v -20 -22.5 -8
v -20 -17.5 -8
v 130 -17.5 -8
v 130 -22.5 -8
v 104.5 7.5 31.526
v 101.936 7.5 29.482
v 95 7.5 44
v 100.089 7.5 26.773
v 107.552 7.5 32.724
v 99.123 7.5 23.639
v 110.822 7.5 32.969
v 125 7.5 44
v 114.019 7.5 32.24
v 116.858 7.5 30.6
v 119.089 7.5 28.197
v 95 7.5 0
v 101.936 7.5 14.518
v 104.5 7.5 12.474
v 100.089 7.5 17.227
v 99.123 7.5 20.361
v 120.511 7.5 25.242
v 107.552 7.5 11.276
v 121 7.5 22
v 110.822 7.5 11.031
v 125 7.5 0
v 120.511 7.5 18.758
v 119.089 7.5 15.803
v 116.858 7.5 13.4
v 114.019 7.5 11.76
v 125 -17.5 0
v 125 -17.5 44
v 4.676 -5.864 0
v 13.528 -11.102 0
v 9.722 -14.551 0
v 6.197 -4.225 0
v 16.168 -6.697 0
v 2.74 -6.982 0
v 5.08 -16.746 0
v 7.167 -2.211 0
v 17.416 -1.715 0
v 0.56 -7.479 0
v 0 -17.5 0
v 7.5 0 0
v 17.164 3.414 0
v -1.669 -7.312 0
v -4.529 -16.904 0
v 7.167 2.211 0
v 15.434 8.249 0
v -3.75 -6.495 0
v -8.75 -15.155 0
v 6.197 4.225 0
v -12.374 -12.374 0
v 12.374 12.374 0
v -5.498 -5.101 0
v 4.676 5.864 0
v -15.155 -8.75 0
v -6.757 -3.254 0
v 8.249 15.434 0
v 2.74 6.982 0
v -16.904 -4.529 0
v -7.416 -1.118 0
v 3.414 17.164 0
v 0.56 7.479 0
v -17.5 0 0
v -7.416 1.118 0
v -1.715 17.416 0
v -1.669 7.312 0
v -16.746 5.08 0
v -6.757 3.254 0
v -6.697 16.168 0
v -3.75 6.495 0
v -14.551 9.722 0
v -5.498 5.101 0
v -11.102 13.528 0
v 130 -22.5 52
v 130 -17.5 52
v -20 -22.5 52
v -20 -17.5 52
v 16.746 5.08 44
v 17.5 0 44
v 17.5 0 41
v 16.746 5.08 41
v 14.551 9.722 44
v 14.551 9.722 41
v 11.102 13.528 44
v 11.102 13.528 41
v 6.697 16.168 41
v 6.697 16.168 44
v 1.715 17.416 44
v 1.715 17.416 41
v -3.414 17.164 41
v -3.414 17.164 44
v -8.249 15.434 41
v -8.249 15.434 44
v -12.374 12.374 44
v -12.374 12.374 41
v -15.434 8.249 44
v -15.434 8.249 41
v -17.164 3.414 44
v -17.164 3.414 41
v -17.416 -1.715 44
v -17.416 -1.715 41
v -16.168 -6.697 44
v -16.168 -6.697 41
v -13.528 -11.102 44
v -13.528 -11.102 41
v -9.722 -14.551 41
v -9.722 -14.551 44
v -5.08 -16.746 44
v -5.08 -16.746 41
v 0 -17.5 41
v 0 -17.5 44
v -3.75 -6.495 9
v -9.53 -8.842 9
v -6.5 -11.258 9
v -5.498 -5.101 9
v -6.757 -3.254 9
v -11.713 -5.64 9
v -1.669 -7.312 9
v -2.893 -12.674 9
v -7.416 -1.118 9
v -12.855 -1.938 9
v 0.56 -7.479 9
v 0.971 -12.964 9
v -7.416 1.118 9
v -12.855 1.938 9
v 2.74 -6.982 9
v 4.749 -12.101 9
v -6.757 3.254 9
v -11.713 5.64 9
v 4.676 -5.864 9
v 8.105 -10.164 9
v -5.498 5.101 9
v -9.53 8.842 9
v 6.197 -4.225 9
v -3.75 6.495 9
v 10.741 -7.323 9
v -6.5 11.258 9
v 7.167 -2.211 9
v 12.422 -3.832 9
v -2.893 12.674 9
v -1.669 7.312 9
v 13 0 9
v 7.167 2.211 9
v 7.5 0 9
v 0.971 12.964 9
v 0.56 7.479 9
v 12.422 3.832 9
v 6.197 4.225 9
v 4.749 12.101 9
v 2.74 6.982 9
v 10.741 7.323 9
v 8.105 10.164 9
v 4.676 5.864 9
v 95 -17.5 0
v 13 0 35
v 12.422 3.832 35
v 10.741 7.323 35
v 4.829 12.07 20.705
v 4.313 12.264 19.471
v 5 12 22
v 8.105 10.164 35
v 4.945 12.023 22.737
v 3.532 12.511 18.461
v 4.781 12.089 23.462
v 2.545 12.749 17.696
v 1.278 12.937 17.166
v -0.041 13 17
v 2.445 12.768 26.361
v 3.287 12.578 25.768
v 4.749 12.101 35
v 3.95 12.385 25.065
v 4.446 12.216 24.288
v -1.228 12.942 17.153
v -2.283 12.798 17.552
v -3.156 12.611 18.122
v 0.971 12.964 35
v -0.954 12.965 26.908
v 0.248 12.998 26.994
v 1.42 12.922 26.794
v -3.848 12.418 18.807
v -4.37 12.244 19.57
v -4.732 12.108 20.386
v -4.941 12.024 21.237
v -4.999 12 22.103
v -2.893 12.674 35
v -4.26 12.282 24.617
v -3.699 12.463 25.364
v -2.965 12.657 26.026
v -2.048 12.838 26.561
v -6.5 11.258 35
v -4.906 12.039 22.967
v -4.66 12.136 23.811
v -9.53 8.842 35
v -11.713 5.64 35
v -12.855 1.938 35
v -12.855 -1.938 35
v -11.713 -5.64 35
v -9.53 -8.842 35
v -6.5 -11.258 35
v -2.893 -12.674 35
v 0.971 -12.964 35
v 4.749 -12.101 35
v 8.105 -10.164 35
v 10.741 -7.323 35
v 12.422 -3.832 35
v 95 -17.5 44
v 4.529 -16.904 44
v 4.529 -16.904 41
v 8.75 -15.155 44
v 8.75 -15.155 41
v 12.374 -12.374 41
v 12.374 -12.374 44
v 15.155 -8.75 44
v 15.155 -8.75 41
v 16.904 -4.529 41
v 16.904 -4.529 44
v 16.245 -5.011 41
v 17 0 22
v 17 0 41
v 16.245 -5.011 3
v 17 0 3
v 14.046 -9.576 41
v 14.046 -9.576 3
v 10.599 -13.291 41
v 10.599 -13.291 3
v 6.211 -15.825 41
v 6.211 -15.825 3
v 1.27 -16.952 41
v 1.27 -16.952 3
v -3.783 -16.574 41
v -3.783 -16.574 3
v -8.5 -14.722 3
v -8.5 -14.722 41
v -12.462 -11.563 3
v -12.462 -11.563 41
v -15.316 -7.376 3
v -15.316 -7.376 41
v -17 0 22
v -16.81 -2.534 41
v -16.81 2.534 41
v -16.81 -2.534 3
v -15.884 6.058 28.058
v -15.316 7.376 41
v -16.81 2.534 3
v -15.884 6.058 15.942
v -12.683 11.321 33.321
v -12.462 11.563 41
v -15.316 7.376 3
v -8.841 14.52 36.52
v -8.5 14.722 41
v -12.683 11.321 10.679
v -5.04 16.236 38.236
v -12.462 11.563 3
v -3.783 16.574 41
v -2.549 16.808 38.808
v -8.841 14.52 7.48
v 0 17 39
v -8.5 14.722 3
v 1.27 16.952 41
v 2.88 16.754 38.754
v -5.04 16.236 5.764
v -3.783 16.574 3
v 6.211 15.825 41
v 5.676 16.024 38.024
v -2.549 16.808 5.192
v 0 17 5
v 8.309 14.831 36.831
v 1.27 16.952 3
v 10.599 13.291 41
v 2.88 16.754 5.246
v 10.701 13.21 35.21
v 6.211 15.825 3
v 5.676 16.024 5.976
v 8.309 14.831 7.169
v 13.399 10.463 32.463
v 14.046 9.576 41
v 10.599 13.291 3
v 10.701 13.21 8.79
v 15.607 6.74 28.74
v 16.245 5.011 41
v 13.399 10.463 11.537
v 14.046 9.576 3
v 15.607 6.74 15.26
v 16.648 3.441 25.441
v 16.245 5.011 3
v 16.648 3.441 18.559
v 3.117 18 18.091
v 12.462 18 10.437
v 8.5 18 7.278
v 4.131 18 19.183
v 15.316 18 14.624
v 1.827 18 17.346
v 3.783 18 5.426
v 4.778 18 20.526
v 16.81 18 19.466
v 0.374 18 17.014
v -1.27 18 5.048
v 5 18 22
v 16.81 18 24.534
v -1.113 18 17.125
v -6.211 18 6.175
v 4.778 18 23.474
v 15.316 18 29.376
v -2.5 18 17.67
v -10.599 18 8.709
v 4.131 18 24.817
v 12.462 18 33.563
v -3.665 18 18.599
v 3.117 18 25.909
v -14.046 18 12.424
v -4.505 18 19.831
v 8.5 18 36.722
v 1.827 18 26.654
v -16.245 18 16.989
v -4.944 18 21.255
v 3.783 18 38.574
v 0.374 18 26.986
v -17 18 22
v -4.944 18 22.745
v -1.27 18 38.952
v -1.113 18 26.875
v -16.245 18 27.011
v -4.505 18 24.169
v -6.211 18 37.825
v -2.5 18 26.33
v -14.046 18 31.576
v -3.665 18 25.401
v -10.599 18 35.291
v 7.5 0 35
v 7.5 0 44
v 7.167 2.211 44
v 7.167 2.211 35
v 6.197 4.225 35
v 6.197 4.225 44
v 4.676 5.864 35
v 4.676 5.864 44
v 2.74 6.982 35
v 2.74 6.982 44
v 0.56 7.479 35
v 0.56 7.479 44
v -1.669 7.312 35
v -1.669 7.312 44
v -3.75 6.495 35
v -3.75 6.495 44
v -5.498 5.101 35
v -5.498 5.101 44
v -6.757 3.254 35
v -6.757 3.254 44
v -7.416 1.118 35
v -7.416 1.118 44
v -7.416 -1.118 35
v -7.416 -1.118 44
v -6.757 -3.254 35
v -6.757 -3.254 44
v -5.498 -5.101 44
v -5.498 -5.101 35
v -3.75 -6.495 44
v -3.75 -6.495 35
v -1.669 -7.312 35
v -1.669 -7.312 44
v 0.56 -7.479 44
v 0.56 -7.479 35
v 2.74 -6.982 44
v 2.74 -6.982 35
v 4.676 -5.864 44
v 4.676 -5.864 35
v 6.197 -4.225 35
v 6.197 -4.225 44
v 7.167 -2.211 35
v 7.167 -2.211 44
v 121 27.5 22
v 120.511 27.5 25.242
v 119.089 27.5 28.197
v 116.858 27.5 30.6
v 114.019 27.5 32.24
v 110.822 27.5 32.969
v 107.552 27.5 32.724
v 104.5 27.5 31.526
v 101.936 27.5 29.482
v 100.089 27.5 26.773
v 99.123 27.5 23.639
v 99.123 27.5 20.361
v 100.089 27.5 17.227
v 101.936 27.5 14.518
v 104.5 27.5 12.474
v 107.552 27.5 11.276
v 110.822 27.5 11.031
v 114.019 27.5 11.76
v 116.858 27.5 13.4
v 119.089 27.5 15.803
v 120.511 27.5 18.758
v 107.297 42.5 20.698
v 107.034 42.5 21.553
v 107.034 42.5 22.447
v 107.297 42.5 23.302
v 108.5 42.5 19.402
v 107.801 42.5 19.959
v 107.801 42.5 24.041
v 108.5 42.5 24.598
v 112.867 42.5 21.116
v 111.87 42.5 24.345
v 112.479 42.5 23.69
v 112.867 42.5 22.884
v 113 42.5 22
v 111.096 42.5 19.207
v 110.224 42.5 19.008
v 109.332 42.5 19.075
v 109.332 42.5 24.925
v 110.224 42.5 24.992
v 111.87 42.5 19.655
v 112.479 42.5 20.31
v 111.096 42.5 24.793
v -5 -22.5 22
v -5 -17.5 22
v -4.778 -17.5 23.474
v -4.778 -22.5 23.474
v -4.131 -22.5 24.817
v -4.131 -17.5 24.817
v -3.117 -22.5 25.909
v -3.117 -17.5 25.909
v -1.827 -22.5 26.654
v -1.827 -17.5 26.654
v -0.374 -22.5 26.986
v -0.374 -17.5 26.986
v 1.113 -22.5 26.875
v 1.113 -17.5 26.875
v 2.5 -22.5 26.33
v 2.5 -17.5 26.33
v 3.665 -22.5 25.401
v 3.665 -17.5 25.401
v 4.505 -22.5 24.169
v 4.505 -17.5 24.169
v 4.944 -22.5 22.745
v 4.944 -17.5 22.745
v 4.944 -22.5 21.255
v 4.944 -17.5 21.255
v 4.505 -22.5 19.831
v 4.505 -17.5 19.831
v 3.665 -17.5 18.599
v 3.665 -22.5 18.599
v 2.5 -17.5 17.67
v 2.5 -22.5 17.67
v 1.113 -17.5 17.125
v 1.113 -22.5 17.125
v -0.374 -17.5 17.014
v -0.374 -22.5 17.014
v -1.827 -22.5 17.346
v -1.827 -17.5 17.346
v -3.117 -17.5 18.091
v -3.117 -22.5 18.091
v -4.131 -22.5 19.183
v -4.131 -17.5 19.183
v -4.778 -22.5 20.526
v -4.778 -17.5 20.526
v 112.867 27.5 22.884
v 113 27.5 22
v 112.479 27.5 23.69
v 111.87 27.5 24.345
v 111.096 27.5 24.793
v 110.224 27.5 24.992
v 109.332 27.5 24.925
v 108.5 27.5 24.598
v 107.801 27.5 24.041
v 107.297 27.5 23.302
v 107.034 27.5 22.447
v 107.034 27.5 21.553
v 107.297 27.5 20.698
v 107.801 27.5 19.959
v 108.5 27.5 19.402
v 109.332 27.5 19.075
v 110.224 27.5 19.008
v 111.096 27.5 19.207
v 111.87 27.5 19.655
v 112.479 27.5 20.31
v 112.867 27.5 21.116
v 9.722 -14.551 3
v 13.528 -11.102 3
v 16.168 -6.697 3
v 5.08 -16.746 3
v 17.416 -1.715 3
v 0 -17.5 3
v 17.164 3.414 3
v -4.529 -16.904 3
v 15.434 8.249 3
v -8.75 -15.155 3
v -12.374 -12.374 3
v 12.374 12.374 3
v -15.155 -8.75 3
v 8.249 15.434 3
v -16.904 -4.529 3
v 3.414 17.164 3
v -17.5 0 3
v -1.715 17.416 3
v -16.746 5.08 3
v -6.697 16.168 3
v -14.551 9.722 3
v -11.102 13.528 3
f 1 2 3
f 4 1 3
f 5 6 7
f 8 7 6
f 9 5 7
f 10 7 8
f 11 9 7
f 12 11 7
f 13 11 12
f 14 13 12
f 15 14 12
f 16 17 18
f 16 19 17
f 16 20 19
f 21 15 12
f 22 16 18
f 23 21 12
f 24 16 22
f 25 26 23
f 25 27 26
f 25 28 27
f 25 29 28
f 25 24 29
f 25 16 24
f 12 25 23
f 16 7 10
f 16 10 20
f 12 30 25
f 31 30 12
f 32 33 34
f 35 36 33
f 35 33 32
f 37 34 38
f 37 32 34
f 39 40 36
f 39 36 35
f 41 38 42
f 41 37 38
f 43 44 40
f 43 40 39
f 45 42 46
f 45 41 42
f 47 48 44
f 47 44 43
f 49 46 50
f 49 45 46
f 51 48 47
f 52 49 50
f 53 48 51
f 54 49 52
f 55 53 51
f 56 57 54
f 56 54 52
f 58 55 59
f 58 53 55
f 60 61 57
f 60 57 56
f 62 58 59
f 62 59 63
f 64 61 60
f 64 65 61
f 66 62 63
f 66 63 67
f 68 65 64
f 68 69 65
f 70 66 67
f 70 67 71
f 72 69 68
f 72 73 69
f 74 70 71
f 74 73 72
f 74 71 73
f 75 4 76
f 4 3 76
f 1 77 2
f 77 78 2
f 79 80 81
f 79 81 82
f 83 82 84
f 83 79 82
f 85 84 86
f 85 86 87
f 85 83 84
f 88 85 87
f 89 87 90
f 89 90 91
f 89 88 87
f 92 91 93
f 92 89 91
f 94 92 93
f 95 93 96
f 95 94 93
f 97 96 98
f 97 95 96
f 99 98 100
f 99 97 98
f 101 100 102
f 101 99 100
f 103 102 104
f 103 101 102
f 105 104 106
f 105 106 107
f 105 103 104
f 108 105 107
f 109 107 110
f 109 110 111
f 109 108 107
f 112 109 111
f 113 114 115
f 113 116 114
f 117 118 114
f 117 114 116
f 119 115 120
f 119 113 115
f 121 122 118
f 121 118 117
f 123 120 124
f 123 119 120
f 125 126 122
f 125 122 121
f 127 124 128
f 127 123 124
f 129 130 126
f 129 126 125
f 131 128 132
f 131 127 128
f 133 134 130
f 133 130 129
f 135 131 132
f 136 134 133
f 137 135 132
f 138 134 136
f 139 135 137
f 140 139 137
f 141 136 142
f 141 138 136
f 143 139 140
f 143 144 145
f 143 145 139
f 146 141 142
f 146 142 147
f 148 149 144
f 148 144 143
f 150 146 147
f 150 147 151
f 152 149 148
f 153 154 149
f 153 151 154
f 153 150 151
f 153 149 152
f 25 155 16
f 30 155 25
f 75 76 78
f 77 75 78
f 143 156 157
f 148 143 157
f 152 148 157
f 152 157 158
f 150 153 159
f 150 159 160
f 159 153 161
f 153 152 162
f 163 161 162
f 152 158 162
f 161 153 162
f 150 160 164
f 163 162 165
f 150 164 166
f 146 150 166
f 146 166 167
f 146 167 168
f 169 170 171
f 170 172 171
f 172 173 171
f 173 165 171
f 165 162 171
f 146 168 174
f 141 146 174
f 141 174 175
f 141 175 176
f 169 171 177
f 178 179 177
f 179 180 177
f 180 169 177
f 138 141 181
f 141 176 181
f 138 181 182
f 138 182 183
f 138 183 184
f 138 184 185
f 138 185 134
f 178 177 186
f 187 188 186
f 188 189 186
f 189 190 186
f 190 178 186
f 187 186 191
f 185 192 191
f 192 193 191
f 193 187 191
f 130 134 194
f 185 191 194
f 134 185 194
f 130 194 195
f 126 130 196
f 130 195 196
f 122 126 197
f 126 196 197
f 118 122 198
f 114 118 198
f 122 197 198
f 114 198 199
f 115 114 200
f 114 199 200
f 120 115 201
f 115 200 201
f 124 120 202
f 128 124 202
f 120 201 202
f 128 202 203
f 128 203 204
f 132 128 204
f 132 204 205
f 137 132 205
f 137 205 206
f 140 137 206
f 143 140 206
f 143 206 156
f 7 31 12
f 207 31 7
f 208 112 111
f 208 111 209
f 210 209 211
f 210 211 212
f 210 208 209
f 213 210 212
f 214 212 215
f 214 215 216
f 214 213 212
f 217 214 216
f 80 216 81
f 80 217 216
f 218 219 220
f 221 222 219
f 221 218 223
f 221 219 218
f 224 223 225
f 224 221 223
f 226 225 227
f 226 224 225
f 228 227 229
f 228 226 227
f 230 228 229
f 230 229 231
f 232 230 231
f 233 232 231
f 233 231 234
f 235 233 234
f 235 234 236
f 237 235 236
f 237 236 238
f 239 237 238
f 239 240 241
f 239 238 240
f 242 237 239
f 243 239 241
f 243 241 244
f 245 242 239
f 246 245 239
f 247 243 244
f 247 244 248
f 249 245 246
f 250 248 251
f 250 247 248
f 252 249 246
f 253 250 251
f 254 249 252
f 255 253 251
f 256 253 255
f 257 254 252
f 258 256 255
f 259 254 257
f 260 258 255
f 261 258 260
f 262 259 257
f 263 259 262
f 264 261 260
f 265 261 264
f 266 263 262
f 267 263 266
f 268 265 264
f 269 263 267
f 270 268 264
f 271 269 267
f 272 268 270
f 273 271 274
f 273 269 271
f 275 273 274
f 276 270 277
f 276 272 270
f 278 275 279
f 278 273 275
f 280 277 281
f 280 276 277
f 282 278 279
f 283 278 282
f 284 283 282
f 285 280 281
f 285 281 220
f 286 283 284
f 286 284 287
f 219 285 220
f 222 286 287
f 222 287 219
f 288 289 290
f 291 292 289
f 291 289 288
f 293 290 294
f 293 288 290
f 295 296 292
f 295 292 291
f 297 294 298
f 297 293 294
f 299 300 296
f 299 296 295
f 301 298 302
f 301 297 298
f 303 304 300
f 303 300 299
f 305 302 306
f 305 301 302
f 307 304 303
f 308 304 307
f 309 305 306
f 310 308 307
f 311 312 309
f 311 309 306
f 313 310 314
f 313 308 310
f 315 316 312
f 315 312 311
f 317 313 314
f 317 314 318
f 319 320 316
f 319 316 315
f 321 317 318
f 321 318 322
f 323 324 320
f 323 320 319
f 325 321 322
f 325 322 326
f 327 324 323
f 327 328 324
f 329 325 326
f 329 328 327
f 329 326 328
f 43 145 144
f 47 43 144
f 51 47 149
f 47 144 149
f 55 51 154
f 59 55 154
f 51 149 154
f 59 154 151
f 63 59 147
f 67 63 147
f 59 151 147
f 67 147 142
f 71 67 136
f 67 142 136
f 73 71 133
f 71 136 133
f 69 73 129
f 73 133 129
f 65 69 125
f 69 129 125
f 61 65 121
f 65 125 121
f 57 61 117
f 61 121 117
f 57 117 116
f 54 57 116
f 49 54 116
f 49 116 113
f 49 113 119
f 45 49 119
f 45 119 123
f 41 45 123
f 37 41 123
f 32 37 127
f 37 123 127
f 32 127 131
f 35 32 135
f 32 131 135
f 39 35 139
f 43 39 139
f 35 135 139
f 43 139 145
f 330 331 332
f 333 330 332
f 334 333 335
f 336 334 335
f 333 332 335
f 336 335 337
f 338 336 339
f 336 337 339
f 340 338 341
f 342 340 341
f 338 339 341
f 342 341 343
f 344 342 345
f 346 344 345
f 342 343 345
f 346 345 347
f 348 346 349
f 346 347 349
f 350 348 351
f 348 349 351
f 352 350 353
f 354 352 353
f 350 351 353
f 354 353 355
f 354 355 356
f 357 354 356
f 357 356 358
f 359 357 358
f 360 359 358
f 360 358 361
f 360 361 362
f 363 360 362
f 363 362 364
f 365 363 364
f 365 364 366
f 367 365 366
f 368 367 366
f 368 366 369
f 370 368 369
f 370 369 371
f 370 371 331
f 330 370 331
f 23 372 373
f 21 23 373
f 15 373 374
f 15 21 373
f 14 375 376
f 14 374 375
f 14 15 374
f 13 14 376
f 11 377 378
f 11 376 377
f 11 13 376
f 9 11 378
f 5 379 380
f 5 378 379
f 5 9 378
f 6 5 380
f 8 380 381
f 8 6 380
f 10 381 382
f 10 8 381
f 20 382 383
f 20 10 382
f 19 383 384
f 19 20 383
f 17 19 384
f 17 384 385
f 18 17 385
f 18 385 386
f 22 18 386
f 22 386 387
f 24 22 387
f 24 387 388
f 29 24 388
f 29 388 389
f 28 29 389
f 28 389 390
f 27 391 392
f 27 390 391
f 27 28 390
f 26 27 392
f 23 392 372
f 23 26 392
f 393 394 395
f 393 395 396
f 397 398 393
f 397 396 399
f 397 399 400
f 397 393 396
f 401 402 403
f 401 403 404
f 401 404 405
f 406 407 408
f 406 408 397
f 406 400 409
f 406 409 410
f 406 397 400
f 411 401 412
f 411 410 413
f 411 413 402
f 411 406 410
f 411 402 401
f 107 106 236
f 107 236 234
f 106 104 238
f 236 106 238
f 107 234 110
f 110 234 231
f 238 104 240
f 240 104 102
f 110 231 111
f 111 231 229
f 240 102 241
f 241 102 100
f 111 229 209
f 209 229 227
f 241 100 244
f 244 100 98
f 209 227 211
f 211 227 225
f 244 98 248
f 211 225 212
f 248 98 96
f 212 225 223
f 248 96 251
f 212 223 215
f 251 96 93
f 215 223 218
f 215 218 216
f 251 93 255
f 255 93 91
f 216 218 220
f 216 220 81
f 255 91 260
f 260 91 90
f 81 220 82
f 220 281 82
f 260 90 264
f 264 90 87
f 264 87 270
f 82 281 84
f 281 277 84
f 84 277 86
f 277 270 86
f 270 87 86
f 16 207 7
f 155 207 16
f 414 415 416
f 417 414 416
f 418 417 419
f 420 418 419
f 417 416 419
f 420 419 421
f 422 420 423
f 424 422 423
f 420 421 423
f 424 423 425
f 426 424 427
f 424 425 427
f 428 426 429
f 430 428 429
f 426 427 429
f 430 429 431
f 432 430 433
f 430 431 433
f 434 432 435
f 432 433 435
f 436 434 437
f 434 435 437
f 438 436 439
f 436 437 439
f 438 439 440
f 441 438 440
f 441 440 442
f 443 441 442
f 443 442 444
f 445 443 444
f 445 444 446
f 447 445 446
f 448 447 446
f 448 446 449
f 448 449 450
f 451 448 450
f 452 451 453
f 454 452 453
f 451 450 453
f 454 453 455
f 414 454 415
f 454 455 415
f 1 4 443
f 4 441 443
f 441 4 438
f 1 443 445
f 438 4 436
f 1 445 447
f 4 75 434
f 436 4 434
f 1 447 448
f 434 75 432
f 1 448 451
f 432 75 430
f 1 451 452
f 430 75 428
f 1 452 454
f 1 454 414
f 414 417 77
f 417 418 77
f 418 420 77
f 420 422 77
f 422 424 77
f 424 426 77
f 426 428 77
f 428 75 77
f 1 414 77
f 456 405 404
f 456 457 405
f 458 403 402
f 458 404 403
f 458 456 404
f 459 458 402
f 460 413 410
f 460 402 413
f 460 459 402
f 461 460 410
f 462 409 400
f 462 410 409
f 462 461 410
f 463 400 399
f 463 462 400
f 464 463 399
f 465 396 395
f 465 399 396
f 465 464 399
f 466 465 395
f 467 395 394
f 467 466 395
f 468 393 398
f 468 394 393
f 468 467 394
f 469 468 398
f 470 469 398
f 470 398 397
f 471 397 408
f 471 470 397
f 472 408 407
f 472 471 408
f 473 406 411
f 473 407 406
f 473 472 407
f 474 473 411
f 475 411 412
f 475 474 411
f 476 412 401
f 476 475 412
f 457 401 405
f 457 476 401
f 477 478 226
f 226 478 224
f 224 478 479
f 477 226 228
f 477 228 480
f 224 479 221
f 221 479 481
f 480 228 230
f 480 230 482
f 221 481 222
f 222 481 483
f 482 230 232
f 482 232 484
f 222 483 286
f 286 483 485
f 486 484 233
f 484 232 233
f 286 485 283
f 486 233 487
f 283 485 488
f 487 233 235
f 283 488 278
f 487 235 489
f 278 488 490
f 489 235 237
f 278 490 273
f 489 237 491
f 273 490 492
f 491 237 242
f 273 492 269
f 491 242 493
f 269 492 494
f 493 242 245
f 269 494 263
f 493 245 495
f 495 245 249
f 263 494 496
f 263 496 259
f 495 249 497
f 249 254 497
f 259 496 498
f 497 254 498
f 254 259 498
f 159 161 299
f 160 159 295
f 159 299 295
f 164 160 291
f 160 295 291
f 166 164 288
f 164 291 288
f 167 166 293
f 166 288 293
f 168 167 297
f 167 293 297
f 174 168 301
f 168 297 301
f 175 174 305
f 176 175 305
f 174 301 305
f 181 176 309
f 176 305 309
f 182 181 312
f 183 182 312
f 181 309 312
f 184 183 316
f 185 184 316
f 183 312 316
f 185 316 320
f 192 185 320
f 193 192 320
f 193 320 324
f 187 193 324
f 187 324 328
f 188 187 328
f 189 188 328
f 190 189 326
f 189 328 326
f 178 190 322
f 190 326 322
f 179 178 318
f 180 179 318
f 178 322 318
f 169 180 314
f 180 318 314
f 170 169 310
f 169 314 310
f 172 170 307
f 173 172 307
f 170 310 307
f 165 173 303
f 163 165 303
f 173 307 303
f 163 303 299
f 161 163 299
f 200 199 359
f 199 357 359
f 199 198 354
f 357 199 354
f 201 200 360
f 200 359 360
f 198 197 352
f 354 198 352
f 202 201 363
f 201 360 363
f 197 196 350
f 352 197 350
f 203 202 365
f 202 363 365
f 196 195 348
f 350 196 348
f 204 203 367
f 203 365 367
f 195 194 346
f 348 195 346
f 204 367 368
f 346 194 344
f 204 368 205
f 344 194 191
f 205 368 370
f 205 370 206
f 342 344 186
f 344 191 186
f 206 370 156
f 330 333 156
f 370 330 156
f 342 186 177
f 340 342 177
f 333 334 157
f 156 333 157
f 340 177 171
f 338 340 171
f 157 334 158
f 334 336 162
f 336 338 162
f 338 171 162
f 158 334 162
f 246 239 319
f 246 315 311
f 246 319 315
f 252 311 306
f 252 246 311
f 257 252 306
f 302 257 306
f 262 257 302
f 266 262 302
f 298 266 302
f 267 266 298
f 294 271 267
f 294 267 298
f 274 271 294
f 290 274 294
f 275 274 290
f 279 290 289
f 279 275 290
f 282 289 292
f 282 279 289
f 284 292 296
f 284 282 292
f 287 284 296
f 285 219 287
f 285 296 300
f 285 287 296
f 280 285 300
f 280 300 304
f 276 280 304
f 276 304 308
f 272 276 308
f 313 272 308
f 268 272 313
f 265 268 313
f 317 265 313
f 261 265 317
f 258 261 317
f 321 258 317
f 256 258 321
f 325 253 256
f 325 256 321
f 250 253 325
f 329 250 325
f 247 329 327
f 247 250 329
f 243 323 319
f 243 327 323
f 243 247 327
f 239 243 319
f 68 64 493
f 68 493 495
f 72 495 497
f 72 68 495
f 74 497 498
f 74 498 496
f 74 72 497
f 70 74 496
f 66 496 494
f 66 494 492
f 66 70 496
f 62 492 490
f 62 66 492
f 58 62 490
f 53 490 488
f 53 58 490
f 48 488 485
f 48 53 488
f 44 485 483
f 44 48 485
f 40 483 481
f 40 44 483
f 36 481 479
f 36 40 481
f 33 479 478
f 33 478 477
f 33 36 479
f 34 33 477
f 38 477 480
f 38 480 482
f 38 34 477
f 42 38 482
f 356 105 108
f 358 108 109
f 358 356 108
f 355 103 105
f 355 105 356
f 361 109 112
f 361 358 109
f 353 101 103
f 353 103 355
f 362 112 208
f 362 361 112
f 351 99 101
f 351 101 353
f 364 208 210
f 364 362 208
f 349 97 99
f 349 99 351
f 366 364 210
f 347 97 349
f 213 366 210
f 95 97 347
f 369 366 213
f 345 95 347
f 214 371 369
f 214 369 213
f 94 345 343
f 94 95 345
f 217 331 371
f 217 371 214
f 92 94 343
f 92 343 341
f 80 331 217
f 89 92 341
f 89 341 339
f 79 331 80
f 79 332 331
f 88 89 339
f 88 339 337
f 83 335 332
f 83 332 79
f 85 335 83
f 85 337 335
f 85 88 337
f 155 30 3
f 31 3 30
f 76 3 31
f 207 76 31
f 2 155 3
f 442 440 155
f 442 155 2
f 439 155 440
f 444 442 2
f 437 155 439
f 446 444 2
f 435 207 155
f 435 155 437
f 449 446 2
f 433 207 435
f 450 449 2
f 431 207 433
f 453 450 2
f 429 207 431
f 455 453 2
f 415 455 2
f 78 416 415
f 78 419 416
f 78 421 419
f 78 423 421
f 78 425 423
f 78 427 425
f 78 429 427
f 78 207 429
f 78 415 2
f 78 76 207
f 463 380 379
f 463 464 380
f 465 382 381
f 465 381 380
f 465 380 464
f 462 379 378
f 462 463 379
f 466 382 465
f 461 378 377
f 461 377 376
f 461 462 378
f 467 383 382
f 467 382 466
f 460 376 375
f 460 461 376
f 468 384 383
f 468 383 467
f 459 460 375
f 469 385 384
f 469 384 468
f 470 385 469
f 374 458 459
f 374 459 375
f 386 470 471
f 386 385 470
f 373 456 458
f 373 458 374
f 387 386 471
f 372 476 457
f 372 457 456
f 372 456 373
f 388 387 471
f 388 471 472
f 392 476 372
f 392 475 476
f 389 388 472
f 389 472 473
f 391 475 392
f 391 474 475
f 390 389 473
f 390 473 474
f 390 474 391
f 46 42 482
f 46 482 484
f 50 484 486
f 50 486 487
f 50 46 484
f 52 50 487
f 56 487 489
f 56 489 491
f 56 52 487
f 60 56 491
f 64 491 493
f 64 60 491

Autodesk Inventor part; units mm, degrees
ref_plane "YZ Plane" through (0, 0, 0) normal (1, 0, 0) x (0, 1, 0)
sketch "Skizze7" plane through (0, 0, 0) normal (0, 0, 1) x (1, 0, 0)
  line L0 (-23.8, 0) -> (23.8, 0) projected
  line L1 (0, -23.8) -> (0, 23.8) projected
  circle A0 centre (0, 0) radius 17
  dimension "d18" = 34
extrude "Extrusion7" add sketch "Skizze7" along normal blind 44
sketch "Skizze8" plane through (0, 0, 44) normal (0, 0, 1) x (1, 0, 0)
  circle A0 centre (0, 0) radius 13
  dimension "d21" = 26
extrude "Extrusion8" cut sketch "Skizze8" against normal blind 44
ref_plane "Arbeitsebene2" through (0, 17, 0) normal (0, 1, 0) x (-1, 0, 0)
sketch "Skizze9" plane through (0, 17, 0) normal (0, 1, 0) x (-1, 0, 0)
  circle A0 centre (0, 22) radius 17
  line L0 (17, 44) -> (-17, 44) projected
  point P0 (0, 0)
  dimension "d25" = 34
  dimension "d26" = 22
extrude "Extrusion9" add sketch "Skizze9" along normal blind 1 and the other way blind 17
sketch "Skizze10" plane through (0, 0, 44) normal (0, 0, 1) x (1, 0, 0)
  circle A0 centre (0, 0) radius 13
extrude "Extrusion10" cut sketch "Skizze10" against normal blind 44
sketch "Skizze11" plane through (0, 18, 22) normal (0, 1, 0) x (1, 0, 0)
  circle A0 centre (0, 0) radius 5
  point P0 (0, 22)
  dimension "d33" = 10
extrude "Extrusion11" cut sketch "Skizze11" against normal blind 20
sketch "Skizze12" plane through (0, 0, 44) normal (0, 0, 1) x (1, 0, 0)
  point P0 (0, 0)
  point P1 (0, 0)
sketch "Skizze13" plane through (0, 0, 44) normal (0, 0, 1) x (1, 0, 0)
  circle A0 centre (0, 0) radius 7.5
  circle A1 centre (0, 0) radius 13
  dimension "d36" = 15
extrude "Extrusion12" add sketch "Skizze13" against normal blind 44
sketch "Skizze14" plane through (0, 0, 44) normal (0, 0, 1) x (1, 0, 0)
  circle A0 centre (0, 0) radius 13
  dimension "d39" = 26
extrude "Extrusion13" cut sketch "Skizze14" against normal blind 35
sketch "Skizze15" plane through (0, 0, 44) normal (0, 0, 1) x (1, 0, 0)
  circle A0 centre (0, 0) radius 7.5
  circle A1 centre (0, 0) radius 13
extrude "Extrusion14" add sketch "Skizze15" against normal blind 9
sketch "Skizze16" plane through (0, 0, 44) normal (0, 0, 1) x (1, 0, 0)
  circle A0 centre (0, 0) radius 13 projected
  circle A1 centre (0, 0) radius 17.5
  circle A2 centre (0, 0) radius 17 projected
  circle A3 centre (0, 0) radius 17
  dimension "d44" = 35
  dimension "d45" = 34
extrude "Extrusion15" add sketch "Skizze16" against normal blind 3 contours A1
sketch "Skizze17" plane through (0, 0, 0) normal (0, 0, -1) x (-1, 0, 0)
  circle A0 centre (0, 0) radius 17
  circle A1 centre (0, 0) radius 17.5
  dimension "d48" = 35
  dimension "d49" = 34
extrude "Extrusion16" add sketch "Skizze17" against normal blind 3
ref_plane "Arbeitsebene4" through (0, -17.5, 0) normal (0, 1, 0) x (-1, 0, 0)
sketch "Skizze21" plane through (0, -17.5, 0) normal (0, 1, 0) x (-1, 0, 0)
  line L0 (20, -8) -> (-130, -8)
  line L1 (-130, -8) -> (-130, 52)
  line L2 (-130, 52) -> (20, 52)
  line L3 (20, 52) -> (20, -8)
  circle A0 centre (0, 22) radius 5 projected
  line L4 (-67, 44) -> (-97, 44) projected
  point P0 (0, 0)
  dimension "d74" = 60
  dimension "d75" = 150
  dimension "d76" = 20
  dimension "d77" = 8
extrude "Extrusion20" add sketch "Skizze21" against normal blind 5
sketch "Skizze22" plane through (0, -17.5, 0) normal (0, 1, 0) x (1, 0, 0)
  line L0 (95, 0) -> (125, 0)
  line L1 (125, 0) -> (125, -44)
  line L2 (125, -44) -> (95, -44)
  line L3 (95, -44) -> (95, 0)
  line L4 (130, 8) -> (-20, 8) projected
  line L5 (130, -52) -> (130, 8) projected
  line L6 (-20, -52) -> (130, -52) projected
  point P0 (0, 0)
  dimension "d80" = 8
  dimension "d81" = 5
  dimension "d82" = 30
  dimension "d83" = 8
extrude "Extrusion21" add sketch "Skizze22" along normal blind 25
sketch "Skizze23" plane through (0, 7.5, 0) normal (0, 1, 0) x (1, 0, 0)
  circle A0 centre (110, -22) radius 11
  line L0 (95, -44) -> (125, -44) projected
  line L1 (95, 0) -> (95, -44) projected
  point P0 (0, 0)
  dimension "d86" = 22
  dimension "d87" = 22
  dimension "d88" = 15
extrude "Extrusion22" add sketch "Skizze23" along normal blind 20
sketch "Skizze24" plane through (110, 27.5, 22) normal (0, 1, 0) x (1, 0, 0)
  circle A0 centre (0, 0) radius 3
  point P0 (-110, 22)
  dimension "d91" = 6
extrude "Extrusion23" add sketch "Skizze24" along normal blind 15
properties part number "Ventilrohr"
